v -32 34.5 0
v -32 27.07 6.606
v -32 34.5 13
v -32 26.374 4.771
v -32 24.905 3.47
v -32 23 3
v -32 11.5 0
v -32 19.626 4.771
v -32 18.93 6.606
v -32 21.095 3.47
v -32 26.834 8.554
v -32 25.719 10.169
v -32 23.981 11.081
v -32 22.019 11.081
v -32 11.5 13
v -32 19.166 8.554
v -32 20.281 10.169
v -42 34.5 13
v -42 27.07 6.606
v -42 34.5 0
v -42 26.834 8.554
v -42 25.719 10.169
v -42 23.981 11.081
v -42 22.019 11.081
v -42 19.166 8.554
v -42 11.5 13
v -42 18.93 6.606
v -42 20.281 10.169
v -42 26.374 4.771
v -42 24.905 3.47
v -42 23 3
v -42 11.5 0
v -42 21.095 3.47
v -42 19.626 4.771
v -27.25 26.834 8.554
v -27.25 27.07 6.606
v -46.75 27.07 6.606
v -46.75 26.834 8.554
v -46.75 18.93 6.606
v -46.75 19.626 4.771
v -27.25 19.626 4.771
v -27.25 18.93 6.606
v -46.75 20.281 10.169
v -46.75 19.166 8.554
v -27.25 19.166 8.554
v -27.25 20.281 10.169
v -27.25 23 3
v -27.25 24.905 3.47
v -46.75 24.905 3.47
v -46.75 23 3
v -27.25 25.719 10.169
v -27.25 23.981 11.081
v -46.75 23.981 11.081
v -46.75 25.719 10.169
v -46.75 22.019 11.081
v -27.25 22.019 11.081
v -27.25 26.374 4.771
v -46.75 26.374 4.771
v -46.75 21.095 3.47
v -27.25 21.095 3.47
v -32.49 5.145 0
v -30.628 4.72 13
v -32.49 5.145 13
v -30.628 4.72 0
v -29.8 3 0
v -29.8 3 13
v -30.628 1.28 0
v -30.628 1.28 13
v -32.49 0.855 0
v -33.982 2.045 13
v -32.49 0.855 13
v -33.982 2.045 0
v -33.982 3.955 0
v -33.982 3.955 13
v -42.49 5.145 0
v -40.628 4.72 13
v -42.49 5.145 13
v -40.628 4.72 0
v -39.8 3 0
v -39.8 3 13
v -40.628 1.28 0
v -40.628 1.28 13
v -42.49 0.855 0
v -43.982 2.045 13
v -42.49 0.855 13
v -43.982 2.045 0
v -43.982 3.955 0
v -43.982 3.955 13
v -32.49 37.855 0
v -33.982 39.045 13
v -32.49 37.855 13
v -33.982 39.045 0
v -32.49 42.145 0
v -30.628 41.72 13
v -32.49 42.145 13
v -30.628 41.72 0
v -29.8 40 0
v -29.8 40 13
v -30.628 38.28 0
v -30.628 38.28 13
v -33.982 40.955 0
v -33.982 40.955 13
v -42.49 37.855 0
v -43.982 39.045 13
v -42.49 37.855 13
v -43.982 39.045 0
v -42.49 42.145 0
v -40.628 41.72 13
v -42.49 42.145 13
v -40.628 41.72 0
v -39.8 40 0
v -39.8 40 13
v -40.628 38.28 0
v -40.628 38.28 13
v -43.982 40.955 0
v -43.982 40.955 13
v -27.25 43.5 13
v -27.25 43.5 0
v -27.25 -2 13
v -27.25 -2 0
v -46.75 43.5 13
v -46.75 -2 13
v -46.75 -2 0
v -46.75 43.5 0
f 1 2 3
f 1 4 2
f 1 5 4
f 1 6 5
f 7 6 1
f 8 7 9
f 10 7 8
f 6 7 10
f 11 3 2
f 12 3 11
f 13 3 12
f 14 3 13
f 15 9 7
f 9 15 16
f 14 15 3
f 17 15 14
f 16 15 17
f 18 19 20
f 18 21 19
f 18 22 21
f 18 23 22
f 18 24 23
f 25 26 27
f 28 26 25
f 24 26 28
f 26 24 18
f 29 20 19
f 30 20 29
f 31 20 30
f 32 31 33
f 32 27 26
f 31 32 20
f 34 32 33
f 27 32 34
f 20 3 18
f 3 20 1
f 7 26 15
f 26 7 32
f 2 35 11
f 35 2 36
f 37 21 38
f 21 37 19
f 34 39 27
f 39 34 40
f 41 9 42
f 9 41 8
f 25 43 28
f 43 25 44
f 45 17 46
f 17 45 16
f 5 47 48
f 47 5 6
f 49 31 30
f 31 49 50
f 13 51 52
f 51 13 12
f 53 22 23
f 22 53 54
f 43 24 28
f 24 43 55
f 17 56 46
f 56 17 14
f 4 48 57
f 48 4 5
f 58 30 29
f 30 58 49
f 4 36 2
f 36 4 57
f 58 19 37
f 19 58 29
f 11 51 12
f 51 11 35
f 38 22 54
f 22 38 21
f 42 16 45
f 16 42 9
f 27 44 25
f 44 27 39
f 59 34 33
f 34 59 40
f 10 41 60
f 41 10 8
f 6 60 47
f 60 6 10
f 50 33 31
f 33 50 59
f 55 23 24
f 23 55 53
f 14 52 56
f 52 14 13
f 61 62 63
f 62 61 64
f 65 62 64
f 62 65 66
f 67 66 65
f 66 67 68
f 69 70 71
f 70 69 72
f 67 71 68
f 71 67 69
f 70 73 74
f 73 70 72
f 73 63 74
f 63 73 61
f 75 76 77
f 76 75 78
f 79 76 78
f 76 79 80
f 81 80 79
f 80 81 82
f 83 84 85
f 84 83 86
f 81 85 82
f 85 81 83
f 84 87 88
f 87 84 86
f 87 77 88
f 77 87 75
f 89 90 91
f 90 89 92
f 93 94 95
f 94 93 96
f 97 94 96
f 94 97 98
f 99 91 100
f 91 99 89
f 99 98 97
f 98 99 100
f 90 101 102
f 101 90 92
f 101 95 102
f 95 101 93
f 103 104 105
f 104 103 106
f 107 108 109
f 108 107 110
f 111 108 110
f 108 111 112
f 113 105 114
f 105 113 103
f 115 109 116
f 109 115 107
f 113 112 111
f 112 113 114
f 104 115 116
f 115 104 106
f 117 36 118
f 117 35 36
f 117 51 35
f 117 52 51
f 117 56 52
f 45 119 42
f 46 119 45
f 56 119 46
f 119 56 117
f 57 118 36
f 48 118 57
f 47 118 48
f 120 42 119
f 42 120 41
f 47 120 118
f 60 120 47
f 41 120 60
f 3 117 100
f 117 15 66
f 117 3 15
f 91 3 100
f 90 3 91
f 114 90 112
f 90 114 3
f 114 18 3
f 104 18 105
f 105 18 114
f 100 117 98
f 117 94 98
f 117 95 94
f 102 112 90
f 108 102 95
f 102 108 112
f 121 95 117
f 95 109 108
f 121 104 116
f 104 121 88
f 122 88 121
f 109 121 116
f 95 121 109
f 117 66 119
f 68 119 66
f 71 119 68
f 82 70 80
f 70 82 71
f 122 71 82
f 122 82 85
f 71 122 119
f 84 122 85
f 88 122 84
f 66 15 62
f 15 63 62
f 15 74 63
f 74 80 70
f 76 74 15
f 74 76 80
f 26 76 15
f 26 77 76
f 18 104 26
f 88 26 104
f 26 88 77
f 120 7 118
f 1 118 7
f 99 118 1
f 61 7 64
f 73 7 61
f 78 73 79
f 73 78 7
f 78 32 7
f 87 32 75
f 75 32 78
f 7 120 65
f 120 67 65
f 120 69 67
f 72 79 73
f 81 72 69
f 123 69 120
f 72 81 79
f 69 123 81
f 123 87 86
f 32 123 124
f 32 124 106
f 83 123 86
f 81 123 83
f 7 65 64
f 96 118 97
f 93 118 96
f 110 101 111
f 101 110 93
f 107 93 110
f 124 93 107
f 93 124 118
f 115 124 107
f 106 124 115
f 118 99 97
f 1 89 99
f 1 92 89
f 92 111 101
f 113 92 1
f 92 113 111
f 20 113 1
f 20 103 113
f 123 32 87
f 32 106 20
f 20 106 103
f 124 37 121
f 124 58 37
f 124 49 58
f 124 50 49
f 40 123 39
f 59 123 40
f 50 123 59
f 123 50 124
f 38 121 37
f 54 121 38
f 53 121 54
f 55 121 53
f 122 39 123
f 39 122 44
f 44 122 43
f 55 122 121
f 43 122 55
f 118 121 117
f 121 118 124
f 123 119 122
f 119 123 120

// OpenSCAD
// file: ../configuration.scad
x_rod_distance = 45;

// Select your belt type ******************************************************

//T2.5
belt_tooth_distance = 2.5;
belt_tooth_ratio = 0.5;

//T5 (strongly discouraged)
//belt_tooth_distance = 5;
//belt_tooth_ratio = 0.75;

//HTD3
//belt_tooth_distance = 3;
//belt_tooth_ratio = 0.75;

//MXL
//belt_tooth_distance = 2.032;
//belt_tooth_ratio = 0.64;

// Select your hot-end mount ******************************************************

// 0 = none; 1 = groove-mount (J-head/MakerGear etc.)
hotend_mount = 1;

hotend_groovemount_depth = 5;
hotend_groovemount_diameter = 11.05;
// main file
// PRUSA iteration3
// Compact extruder
// GNU GPL v3
// Josef Průša <iam@josefprusa.cz> and contributors
// http://www.reprap.org/wiki/Prusa_Mendel
// http://prusamendel.org

include <../configuration.scad>



module motor_dummy(){
	translate([-22,-22,-5]) %cube([44,44,5]);
	translate([18,18,-5]) %cylinder(r=2, h=24);
	translate([18,-18,-5]) %cylinder(r=2, h=24);
	translate([-18,18,-5]) %cylinder(r=2, h=24);
	translate([-18,-18,-5]) %cylinder(r=2, h=24);
	translate([-22+2.5+10,0,-5]) %cylinder(r=2.5, h=7);
	
}

module extruder_base(){
 // Main body
 translate([-1,-2,0]) cube([22,56,30]);
 // Extruder plate mount
 if (hotend_mount == 1) { // groove-mount
  translate([-16,49,0]) cube([55,5 + hotend_groovemount_depth - 1.5,24]);
 } else {
  translate([-16,49,0]) cube([55,5,30]);
 }
 
 // Carriage mount cylinders
 translate([11,25,0]){
  translate([-12,24,0]) cylinder(r=5, h=30);
  translate([12,24,0]) cylinder(r=5, h=30);
 }

 // Smoother join
 translate([1,38,0]) rotate([0,0,45])  cube([10,10,30]);
}

module extruder_holes(){
 translate([11,25,0]){ // Translate to center of the main block
  // Main shaft opening
  translate([0,-2,-1]) cylinder(r=6.5, h=36);

  // Lower motor mount hole
  translate([-8.5,18-2,-1]) cylinder(r=2, h=35);
  translate([-8.5,18-2,21]) cylinder(r=3.1, h=35);
  // Upper motor mount hole
  translate([-8.5,-18-2,-1]) cylinder(r=2, h=35);
  translate([-8.5,-18-2,21]) cylinder(r=3.1, h=35);
  // Idler motor mount hole
  translate([-8.5+36,18-2,-1]) cylinder(r=2, h=35);
  translate([-8.5+36,18-2,21]) cylinder(r=3.1, h=35);

  // Carriage mount right screw head hole
  translate([-12,24,-3]) cylinder(r=3.5, h=23);
  // Carriage mount left screw head hole
  translate([12,24,-3]) cylinder(r=3.5, h=23);
  // Carriage mount right screw hole
  translate([-12,24,20.5]) cylinder(r=2, h=23);
  // Carriage mount left screw head hole
  translate([12,24,20.5]) cylinder(r=2, h=23);
  // Idler bearing cutout
  translate([11,0-2,-4.5+10]) cylinder(r=11, h=20);
 }
 // Filament path
 translate([1.5+11+3.5,65,11]) rotate([90,0,0]) cylinder(r=2, h=70);
 if (hotend_mount == 1) {
  // Hole for hotend
  translate([1.5+11+3.5,65,11]) rotate([90,0,0]) cylinder(r=hotend_groovemount_diameter/2, h=12.5);
 }
 // Hole for drive gear check
 translate([1.5+11+3.5-30,25,11]) rotate([90,0,90]) cylinder(r=4, h=70, $fn=20);
 translate([1.5+11+3.5-30,23,11]) rotate([90,0,90]) cylinder(r=4, h=70, $fn=20);
 translate([1.5+11+3.5-30,21,11]) rotate([90,0,90]) cylinder(r=4, h=70, $fn=20);

 // Left extruder plate mounting hole
 translate([1.5+11+3.5+15,65,11]) rotate([90,0,0]) cylinder(r=1.8, h=70);
 translate([1.5+11+3.5+15,47,11]) rotate([90,0,0]) cylinder(r=3.1, h=70, $fn=6);
 // Right extruder plate mounting hole
 translate([1.5+11+3.5-25,65,11]) rotate([90,0,0]) cylinder(r=1.8, h=70);
 translate([1.5+11+3.5-25,47,11]) rotate([90,0,0]) cylinder(r=3.1, h=70, $fn=6);

  // Idler mounting holes
  translate([11,25,10]){
   // Nut traps
   translate([-30,15,-5]) rotate([0,90,0]) rotate([0,0,30]) cylinder(r=3.3, h=30, $fn=6);
   translate([-30,-22,-5]) rotate([0,90,0]) rotate([0,0,30]) cylinder(r=3.3, h=30, $fn=6);
   translate([-30,15,5]) rotate([0,90,0]) rotate([0,0,30]) cylinder(r=3.3, h=30, $fn=6);
   translate([-30,-22,5]) rotate([0,90,0]) rotate([0,0,30]) cylinder(r=3.3, h=30, $fn=6);
   // Screws
   translate([-30,-22,-5]) rotate([0,90,0]) cylinder(r=2, h=70);
   translate([-30,-22,5]) rotate([0,90,0]) cylinder(r=2, h=70);
   translate([-30,15,-5]) rotate([0,90,0]) cylinder(r=2, h=70);
   translate([-30,15,5]) rotate([0,90,0]) cylinder(r=2, h=70);
	}

 translate([46,46,-1]) rotate([0,0,45]) cube([20,20,36]);
 translate([46,13,-1]) rotate([0,0,45]) cube([20,20,36]);
 translate([-22,46,-1]) rotate([0,0,45]) cube([20,20,36]);
 translate([-22,24,-1]) rotate([0,0,45]) cube([20,20,36]);
 translate([-8,-20,-1]) rotate([0,0,45]) cube([20,20,36]);
 translate([30,-20,-1]) rotate([0,0,45]) cube([20,20,36]);
}

module extruder_idler_base(){
 translate([0.25,0,0]) cube([19.5,45.5,8+5]);
	
}

module extruder_idler_holes(){
 translate([10,25,0]){
  // Main cutout
  cube([10,23,27], center= true);
  // Idler shaft
  translate([-12,0,4.1+3])rotate([0,90,0])cylinder(r=4.1, h=24);
  // Screw holes
  translate([5,-20,-1])cylinder(r=2.2, h=24);
  translate([-5,-20,-1])cylinder(r=2.2, h=24);
  translate([5,17,-1])cylinder(r=2.2, h=24);
  translate([-5,17,-1])cylinder(r=2.2, h=24);
 }
}


// Idler final part
module idler(){
 difference(){
  extruder_idler_base();
  extruder_idler_holes();
 }
}

//translate([12,0,1]) rotate([0,-90,0]) idler();
translate([-47,-2,0])  idler();
// Extruder final part
module extruder(){
 translate([-23,2,0])difference(){
  extruder_base();
  extruder_holes();
 }
}

//extruder();
//translate([-2.5,25,0]) motor_dummy();
